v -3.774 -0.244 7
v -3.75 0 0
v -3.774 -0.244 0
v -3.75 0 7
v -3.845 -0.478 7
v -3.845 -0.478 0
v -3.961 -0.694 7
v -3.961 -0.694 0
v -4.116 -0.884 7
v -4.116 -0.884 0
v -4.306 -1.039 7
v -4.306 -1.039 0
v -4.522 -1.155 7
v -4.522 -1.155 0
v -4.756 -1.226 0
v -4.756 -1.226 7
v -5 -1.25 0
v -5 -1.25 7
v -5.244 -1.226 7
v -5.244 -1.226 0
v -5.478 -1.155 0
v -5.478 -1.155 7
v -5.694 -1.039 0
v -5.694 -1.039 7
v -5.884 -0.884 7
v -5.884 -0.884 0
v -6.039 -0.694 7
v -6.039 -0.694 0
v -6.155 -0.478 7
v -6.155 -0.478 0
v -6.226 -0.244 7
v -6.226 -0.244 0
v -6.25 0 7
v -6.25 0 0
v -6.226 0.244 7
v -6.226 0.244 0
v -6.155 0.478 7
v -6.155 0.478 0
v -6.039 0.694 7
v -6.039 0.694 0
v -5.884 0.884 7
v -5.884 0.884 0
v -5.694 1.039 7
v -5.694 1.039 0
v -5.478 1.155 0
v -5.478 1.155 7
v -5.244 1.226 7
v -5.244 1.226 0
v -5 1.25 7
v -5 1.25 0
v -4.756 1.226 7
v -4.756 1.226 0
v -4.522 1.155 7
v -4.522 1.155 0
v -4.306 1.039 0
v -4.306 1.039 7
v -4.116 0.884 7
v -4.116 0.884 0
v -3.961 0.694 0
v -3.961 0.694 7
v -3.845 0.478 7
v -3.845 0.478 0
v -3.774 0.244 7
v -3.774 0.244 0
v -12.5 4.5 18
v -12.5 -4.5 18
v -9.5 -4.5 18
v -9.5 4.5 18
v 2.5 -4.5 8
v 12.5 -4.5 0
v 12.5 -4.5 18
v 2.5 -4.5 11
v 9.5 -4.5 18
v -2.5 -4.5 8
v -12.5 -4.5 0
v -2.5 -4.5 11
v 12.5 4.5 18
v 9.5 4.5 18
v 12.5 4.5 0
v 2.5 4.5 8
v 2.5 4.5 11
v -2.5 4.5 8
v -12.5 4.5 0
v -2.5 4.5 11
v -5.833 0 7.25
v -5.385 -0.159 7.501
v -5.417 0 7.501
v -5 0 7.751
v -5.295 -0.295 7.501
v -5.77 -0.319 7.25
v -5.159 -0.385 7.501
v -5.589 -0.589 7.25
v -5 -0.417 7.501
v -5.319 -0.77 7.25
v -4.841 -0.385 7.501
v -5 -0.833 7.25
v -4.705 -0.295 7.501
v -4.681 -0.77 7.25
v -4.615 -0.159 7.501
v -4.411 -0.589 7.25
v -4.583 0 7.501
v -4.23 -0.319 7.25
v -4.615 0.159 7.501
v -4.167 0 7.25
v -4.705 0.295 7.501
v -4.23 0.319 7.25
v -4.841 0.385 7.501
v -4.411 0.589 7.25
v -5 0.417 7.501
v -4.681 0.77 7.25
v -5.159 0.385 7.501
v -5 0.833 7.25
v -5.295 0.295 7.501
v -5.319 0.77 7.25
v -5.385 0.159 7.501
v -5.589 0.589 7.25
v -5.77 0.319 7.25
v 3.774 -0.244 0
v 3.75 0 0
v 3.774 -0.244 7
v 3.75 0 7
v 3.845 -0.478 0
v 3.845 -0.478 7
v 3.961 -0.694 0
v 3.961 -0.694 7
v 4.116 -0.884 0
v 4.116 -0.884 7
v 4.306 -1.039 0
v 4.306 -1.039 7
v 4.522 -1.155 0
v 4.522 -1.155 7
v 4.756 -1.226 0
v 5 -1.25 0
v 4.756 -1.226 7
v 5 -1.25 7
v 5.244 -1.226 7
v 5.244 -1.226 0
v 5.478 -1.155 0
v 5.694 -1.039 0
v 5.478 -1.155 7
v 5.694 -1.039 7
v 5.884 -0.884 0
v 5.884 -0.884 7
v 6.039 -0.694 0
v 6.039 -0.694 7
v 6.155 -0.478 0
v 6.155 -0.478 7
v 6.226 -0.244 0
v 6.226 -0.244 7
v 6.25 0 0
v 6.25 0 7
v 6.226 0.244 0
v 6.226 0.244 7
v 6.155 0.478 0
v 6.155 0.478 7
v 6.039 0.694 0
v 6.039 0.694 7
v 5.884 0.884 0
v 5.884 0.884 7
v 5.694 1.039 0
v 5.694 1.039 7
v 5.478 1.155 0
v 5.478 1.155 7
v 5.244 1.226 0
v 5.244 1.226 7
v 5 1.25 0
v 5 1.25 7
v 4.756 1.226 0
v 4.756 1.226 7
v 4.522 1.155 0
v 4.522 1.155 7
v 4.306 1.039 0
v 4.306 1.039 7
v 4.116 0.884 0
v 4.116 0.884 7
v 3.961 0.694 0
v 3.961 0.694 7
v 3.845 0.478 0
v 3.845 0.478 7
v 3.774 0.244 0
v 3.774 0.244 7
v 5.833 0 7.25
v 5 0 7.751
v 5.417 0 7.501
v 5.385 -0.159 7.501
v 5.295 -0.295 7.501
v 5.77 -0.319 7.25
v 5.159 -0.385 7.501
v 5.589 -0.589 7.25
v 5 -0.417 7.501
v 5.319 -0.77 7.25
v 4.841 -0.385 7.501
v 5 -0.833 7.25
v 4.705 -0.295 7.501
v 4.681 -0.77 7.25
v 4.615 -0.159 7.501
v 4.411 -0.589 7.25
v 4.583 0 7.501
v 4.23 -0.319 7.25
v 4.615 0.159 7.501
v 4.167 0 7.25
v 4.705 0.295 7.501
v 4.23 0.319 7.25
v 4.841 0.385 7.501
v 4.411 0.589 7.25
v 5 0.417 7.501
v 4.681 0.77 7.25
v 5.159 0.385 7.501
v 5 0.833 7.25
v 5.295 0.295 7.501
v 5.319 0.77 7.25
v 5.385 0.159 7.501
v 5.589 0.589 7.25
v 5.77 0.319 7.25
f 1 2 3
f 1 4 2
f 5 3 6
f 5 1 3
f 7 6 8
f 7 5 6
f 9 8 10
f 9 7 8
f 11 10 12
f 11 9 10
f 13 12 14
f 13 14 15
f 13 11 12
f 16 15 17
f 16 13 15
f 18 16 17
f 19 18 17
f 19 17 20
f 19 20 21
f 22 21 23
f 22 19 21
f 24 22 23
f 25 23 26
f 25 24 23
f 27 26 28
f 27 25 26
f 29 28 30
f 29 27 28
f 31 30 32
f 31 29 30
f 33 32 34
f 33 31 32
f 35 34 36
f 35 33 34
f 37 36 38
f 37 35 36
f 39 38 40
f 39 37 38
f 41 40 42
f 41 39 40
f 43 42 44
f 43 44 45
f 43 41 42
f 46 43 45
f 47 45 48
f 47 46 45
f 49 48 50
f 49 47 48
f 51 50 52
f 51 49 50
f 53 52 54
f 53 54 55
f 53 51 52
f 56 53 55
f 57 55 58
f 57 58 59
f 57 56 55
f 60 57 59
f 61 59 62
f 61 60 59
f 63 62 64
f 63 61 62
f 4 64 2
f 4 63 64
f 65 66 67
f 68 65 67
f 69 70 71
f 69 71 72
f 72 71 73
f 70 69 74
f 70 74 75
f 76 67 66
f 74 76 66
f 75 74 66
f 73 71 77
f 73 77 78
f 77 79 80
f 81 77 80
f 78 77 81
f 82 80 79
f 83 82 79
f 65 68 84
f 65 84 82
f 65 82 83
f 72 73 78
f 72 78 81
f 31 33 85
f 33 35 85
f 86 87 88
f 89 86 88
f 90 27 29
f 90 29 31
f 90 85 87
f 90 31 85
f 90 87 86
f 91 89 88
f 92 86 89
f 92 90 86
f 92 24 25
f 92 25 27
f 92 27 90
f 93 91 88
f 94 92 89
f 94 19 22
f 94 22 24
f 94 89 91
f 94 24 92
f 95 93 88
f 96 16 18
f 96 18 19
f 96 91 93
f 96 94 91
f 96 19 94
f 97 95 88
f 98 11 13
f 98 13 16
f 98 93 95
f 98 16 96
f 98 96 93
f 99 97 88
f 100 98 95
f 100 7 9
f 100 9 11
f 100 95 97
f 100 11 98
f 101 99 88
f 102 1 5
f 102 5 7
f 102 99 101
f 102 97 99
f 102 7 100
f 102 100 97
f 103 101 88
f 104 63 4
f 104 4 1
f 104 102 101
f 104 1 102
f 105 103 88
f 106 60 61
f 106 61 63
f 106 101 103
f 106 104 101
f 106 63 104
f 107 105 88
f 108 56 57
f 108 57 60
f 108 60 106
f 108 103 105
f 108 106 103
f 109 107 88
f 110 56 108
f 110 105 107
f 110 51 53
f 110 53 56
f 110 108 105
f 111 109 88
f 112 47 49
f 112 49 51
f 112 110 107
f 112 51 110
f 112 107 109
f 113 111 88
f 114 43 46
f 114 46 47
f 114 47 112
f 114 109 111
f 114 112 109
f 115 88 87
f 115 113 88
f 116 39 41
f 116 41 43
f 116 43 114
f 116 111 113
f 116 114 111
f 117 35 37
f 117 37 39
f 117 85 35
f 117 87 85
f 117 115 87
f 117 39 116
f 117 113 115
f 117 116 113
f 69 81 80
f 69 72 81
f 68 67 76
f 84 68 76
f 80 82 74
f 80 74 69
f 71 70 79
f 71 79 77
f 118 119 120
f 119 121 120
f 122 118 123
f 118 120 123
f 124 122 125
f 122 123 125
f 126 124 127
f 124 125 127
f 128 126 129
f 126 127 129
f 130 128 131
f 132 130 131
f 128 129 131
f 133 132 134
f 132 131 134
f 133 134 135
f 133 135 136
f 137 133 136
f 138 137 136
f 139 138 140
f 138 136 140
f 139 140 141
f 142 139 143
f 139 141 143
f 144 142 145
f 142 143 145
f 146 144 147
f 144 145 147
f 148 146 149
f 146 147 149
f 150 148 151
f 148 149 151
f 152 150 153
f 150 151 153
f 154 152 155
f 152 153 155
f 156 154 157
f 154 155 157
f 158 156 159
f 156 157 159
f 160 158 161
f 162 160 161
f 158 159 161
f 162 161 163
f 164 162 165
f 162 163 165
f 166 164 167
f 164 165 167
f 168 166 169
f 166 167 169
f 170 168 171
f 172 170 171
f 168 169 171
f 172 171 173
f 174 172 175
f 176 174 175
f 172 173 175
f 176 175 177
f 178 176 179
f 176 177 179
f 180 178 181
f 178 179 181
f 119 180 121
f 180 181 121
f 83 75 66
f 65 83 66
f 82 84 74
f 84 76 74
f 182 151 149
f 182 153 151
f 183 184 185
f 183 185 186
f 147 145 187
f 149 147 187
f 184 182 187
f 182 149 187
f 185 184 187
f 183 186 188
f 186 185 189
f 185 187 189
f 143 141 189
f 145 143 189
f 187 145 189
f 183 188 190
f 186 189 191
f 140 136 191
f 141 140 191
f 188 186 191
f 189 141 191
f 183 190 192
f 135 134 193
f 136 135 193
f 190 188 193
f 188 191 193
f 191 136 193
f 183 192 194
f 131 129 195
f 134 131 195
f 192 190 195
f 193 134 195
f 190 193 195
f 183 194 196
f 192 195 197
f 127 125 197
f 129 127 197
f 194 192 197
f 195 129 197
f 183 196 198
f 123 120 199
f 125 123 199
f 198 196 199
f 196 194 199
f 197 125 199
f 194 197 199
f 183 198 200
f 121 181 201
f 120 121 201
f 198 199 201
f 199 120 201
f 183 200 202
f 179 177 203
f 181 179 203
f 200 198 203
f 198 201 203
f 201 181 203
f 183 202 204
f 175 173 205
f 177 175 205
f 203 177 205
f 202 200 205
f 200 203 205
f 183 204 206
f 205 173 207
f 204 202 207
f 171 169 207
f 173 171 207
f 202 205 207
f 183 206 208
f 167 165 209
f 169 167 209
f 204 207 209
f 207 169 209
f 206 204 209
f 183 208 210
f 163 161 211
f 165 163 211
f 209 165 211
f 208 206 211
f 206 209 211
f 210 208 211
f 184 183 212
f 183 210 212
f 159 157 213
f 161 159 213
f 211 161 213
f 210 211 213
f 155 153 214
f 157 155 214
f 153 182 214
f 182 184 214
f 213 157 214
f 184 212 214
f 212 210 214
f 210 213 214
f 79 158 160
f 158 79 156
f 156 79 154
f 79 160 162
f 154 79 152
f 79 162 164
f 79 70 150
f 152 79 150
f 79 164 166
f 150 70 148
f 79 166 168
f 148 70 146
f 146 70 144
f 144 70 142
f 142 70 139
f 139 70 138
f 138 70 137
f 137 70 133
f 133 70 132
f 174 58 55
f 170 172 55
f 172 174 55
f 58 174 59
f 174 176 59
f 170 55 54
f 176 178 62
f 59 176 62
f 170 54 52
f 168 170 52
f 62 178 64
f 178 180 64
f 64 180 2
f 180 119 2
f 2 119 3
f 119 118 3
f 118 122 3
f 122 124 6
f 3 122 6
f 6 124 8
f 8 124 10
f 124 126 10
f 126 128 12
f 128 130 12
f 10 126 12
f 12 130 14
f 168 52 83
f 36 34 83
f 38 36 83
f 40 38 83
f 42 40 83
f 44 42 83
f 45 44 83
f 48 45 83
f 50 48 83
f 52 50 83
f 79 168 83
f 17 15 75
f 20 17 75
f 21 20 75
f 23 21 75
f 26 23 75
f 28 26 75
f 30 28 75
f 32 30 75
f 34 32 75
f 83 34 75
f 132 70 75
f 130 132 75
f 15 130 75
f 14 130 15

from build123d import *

# Parameters (mm, degrees)
F1_DEPTH = 4.5
F3_D     = 2.5
F3_DEPTH = 7
F3_TIP   = 0.7510757738


with BuildPart() as f1:
    # F0 (on Front) → F1 (new body, symmetric)
    with BuildSketch(Plane.XZ):
        Polygon((0, 8), (0, 0), (12.5, 0), (12.5, 18), (9.5, 18), (2.5, 11), (2.5, 8), align=None)
    extrude(amount=F1_DEPTH, both=True)

    # F3
    with Locations(Plane(origin=(0, 0, 0), x_dir=(1, 0, 0), z_dir=(0, 0, -1))):
        with Locations((5, 0)):
            Hole(F3_D / 2, depth=F3_DEPTH)
            with Locations((0, 0, -(F3_DEPTH + F3_TIP / 2))):  # 118° drill point
                Cone(0, F3_D / 2, F3_TIP, mode=Mode.SUBTRACT)

    # F4: F1 across plane


with BuildPart() as f1_1:
    add(f1.part)
    add(f1.part.mirror(Plane.YZ))


solid = f1_1.part
